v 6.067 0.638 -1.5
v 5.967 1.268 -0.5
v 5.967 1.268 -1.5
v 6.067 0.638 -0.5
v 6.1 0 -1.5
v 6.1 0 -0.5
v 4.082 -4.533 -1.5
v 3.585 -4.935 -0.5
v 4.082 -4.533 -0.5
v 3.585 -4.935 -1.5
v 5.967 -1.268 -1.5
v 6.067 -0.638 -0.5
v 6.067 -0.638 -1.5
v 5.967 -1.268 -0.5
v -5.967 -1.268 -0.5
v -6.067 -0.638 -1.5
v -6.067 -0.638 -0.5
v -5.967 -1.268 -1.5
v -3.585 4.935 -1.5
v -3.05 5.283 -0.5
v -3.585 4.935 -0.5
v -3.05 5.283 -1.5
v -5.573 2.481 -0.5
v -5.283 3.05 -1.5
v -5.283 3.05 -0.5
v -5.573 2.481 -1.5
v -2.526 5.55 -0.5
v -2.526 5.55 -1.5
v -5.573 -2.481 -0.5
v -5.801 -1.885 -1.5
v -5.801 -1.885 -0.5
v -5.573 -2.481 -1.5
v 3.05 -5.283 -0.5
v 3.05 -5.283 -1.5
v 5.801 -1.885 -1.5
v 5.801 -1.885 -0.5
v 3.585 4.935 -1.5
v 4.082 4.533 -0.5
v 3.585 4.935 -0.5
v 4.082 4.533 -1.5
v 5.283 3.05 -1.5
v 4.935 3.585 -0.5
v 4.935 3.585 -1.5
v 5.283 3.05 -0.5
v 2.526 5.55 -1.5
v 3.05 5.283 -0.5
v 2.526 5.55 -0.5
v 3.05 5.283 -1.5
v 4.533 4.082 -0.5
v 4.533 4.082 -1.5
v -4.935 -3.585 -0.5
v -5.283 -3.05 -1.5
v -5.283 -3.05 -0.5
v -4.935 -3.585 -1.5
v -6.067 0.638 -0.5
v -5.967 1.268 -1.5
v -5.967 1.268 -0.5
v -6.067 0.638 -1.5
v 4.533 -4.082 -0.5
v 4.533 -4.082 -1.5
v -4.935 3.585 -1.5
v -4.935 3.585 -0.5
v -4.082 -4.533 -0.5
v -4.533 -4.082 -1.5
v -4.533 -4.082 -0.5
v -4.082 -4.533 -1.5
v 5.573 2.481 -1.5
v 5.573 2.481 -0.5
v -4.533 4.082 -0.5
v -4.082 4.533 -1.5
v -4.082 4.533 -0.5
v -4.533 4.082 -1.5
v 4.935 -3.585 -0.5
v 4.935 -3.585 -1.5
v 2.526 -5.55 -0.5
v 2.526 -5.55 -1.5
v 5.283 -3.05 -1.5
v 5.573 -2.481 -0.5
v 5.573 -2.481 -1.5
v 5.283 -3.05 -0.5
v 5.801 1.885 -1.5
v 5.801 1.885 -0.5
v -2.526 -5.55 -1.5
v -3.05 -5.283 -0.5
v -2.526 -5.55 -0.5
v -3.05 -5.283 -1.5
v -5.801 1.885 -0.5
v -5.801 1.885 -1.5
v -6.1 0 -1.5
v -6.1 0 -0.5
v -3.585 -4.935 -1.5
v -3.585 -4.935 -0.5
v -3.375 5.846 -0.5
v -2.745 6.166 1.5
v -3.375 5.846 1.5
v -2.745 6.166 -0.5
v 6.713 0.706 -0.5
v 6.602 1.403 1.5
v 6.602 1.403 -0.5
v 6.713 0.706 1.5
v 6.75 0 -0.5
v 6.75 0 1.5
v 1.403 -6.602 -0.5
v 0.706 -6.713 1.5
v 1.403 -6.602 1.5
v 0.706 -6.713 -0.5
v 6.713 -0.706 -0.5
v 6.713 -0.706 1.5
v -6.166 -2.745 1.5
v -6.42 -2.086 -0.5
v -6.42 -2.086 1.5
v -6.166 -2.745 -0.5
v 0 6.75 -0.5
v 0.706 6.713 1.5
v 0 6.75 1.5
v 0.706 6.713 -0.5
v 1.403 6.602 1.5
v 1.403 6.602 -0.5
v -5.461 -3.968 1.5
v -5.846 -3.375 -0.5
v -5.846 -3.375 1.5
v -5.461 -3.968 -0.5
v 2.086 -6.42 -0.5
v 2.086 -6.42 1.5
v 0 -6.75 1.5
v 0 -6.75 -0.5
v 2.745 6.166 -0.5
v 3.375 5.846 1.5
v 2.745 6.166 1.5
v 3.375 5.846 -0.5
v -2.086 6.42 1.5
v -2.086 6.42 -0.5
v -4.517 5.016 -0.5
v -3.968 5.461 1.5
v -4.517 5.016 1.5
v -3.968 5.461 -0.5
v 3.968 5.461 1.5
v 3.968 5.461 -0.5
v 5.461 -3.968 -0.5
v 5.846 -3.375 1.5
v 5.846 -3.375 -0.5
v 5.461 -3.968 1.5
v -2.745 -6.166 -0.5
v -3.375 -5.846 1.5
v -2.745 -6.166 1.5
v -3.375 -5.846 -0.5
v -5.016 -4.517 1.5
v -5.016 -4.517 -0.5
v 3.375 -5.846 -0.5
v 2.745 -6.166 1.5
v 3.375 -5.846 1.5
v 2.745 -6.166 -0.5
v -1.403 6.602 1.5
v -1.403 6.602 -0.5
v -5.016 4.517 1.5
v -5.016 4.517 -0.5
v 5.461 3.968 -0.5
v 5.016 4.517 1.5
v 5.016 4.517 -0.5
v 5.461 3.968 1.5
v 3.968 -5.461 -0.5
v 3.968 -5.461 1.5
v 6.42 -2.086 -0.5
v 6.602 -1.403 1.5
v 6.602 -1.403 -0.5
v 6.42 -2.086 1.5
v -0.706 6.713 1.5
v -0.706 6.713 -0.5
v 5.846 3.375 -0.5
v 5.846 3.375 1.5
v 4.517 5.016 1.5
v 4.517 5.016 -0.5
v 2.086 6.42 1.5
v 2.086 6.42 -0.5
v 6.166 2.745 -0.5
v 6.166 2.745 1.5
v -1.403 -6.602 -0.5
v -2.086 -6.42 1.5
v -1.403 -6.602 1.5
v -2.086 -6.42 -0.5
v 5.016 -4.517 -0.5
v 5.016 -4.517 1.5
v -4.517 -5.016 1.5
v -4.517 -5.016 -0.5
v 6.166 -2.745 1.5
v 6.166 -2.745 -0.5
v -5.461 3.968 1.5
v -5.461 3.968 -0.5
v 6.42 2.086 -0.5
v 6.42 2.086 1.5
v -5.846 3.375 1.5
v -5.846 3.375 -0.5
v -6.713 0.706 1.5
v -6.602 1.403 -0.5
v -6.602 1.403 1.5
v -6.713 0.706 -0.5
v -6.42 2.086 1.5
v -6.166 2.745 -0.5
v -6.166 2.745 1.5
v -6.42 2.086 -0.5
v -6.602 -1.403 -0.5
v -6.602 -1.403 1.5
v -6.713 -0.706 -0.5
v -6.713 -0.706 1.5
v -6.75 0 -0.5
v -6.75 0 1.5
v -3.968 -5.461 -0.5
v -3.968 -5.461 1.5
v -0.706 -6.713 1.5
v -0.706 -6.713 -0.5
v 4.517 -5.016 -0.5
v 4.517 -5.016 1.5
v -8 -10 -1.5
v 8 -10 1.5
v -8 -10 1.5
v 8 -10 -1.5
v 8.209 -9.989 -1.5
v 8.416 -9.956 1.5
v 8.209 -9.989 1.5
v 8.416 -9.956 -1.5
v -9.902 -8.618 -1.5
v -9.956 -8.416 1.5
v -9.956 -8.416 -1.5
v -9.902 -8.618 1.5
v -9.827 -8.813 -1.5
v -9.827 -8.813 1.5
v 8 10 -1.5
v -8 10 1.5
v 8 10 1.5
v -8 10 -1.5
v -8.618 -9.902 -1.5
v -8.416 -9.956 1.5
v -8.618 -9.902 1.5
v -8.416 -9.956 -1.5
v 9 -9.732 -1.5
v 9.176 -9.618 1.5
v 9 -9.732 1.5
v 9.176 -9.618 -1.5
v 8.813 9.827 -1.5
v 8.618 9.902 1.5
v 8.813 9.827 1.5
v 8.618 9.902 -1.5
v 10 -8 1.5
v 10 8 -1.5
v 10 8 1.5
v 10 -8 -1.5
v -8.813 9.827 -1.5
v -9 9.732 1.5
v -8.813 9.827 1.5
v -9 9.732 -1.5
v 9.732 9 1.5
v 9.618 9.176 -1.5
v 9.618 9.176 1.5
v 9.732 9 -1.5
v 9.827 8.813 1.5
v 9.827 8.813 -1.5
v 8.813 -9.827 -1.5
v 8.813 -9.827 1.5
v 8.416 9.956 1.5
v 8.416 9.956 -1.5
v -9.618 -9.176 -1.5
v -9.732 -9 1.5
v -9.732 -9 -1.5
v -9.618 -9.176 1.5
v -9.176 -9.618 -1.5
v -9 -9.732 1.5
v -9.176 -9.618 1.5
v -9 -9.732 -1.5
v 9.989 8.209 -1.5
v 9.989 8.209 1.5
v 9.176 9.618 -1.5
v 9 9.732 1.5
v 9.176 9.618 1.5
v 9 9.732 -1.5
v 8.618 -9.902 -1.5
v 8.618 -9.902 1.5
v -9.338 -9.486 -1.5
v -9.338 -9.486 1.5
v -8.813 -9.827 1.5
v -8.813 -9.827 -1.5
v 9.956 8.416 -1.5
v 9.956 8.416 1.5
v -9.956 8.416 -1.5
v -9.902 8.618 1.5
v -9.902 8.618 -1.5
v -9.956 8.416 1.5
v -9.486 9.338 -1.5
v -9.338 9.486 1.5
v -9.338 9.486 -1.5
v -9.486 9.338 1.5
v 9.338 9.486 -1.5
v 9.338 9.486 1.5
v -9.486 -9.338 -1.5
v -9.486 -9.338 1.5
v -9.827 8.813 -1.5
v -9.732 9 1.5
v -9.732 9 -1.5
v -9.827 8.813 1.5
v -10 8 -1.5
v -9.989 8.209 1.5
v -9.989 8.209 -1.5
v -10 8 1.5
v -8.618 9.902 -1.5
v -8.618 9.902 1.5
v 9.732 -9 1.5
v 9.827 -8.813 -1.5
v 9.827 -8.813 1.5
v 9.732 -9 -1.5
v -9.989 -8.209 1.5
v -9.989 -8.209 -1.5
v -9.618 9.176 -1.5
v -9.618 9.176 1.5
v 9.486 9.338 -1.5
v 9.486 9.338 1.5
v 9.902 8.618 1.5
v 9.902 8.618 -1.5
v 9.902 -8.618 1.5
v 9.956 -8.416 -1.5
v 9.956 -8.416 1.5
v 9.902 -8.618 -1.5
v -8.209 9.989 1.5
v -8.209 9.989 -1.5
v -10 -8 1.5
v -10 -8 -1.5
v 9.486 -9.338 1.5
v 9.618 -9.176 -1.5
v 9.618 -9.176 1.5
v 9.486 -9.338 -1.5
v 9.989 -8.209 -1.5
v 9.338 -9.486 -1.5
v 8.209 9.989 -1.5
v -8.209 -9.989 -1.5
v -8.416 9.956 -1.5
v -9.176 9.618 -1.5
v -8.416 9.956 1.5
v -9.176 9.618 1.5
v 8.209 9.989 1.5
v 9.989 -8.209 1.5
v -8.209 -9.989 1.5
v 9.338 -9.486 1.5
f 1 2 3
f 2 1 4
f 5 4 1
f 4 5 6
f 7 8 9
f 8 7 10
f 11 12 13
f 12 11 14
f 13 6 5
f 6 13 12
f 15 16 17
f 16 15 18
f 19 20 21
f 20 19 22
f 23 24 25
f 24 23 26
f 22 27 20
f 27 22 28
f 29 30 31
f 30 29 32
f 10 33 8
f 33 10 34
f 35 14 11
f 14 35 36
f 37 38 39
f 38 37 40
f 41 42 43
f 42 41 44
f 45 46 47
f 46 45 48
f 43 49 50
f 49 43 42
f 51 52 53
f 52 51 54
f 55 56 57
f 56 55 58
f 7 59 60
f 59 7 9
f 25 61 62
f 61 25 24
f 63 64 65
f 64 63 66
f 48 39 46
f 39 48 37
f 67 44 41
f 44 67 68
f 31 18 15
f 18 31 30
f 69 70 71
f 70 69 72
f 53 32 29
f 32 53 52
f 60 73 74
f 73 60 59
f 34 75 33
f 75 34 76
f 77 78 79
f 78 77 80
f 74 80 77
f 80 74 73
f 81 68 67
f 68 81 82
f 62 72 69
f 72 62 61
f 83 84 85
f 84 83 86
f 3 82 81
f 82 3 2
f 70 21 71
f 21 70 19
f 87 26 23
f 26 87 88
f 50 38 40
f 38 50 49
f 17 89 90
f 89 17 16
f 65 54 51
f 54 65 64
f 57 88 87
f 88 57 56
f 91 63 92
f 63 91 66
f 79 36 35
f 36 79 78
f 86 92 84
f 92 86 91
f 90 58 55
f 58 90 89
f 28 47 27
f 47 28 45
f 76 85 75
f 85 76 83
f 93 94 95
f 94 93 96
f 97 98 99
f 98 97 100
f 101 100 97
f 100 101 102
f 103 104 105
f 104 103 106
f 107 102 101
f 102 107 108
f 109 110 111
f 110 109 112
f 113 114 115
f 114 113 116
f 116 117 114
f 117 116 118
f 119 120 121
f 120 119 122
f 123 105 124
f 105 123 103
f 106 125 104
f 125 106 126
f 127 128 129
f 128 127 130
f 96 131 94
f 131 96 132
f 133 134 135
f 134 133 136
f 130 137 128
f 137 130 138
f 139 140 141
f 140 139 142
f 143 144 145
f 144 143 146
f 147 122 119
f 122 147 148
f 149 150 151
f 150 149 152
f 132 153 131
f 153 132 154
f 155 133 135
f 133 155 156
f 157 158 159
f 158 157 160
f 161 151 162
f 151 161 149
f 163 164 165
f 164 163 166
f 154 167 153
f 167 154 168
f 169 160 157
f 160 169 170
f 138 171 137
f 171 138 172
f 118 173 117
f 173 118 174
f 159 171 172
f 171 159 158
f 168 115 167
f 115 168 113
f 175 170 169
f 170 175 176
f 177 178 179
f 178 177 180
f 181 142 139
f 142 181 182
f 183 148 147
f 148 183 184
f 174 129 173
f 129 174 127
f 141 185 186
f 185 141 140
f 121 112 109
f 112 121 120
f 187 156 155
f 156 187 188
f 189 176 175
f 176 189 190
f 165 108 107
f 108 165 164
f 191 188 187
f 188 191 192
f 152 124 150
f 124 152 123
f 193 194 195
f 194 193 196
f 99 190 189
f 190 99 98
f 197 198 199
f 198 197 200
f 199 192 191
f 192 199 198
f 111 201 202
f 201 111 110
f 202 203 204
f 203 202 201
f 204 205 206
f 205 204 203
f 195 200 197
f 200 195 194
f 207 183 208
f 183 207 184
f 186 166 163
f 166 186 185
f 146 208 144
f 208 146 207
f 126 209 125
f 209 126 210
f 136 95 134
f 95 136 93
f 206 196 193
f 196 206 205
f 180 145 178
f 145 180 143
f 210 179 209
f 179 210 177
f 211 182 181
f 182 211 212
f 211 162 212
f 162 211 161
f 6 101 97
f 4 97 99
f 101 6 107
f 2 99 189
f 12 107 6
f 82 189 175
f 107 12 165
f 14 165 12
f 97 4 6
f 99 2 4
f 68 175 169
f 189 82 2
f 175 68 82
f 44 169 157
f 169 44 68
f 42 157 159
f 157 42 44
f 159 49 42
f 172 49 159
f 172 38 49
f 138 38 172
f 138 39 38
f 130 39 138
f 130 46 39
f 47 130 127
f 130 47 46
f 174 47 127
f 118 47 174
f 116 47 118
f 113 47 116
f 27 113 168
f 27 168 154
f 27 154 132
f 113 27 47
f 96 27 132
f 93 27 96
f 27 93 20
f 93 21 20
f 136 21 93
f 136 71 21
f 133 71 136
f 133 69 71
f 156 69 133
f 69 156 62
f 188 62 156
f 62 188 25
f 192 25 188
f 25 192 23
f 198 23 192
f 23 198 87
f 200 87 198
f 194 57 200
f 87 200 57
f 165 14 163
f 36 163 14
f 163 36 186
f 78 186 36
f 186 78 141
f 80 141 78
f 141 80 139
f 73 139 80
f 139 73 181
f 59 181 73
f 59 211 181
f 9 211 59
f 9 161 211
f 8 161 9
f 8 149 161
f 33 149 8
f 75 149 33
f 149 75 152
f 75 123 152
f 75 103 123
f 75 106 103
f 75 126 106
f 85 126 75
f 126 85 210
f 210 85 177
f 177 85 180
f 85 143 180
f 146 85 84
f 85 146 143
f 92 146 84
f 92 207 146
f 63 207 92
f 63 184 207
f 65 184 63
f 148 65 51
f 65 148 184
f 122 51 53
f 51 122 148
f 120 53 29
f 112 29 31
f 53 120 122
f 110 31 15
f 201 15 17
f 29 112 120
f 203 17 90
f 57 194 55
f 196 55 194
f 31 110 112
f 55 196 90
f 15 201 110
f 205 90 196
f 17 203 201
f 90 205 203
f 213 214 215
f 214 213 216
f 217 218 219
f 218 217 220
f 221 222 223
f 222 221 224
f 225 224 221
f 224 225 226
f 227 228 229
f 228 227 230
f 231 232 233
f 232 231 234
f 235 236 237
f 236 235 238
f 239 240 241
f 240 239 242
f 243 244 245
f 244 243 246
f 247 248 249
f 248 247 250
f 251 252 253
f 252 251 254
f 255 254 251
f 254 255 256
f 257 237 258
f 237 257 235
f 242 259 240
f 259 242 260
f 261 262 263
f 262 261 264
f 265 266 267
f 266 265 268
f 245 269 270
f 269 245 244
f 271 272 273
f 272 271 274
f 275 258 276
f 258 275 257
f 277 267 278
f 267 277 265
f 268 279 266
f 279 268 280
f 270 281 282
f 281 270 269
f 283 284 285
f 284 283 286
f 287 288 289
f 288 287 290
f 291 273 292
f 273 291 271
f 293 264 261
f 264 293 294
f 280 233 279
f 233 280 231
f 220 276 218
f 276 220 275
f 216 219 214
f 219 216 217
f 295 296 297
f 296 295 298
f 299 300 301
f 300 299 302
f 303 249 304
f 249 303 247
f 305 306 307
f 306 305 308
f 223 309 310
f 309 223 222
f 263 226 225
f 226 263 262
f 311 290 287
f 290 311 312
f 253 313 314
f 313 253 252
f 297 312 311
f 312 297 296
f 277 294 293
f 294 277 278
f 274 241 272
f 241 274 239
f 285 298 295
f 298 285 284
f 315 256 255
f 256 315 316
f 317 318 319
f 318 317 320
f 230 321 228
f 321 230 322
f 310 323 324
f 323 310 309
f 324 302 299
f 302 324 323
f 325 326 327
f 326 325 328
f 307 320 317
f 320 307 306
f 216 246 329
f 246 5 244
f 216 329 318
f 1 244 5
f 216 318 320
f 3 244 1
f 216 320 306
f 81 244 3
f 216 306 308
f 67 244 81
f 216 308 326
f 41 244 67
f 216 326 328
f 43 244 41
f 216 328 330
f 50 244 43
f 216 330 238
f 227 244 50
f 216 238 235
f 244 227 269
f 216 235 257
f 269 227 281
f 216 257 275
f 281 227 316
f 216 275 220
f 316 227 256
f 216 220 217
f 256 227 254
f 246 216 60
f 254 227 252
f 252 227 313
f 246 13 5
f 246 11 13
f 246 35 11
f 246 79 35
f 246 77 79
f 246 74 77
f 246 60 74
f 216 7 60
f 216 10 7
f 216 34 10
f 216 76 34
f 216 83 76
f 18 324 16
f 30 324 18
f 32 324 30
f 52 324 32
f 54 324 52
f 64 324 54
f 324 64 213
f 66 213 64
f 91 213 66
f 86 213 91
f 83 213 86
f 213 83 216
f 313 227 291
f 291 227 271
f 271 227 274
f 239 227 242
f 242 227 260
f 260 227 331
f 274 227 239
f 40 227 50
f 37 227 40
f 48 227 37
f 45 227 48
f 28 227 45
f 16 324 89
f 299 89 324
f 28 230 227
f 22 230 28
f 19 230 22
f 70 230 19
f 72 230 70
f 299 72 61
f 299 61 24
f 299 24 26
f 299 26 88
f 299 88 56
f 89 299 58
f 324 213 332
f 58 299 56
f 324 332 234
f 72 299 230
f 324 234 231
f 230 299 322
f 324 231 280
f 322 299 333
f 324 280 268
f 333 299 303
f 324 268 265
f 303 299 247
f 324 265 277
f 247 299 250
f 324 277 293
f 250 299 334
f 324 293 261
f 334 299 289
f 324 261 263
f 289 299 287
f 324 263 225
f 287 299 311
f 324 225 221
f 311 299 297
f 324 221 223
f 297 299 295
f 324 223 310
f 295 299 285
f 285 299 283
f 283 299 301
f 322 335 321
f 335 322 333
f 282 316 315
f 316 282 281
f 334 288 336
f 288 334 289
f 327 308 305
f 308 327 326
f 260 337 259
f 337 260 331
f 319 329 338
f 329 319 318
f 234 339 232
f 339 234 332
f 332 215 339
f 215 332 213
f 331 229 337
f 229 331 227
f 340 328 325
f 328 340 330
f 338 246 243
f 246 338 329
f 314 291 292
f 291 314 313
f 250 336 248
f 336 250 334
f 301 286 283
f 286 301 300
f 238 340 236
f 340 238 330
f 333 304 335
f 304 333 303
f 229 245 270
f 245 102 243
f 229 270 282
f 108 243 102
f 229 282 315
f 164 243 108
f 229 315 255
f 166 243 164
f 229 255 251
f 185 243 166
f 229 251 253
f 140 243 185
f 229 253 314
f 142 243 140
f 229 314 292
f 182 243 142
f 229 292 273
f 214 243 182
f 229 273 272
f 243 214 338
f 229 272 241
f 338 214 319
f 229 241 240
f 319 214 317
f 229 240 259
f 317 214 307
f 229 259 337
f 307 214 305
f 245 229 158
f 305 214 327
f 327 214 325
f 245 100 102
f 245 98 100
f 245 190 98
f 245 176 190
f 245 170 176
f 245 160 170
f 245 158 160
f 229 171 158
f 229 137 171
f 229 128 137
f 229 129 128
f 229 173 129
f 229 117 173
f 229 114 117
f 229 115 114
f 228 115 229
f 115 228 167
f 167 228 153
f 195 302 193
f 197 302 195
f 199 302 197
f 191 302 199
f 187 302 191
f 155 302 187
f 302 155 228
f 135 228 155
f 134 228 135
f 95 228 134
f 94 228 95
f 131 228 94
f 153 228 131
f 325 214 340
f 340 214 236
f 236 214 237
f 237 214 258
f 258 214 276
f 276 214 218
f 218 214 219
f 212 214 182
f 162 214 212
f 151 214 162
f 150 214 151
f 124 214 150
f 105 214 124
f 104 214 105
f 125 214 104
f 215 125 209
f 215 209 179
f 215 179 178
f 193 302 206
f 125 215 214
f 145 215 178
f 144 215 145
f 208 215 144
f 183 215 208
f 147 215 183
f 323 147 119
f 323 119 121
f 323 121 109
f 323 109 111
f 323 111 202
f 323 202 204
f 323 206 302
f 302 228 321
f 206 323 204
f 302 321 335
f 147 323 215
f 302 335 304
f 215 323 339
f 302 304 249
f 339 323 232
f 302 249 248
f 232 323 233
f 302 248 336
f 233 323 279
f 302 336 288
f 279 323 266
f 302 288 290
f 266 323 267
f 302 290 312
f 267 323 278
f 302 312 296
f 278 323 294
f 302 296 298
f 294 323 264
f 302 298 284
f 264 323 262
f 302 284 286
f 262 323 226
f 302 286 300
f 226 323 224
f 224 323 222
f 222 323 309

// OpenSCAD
// file: button_PBS-33B.scad
$fn = 60;

buttonOD = 10;
buttoniD = 5.6;
buttonHeigth = 1.6;
//buttonHeigth = 2.6;

headOD   = 17.5;
headMD  = 14.83;
headID  = 11.8;
headHeigth = 5.5;

stepShaftOD  = 13.5; // 13.1
stepShaftHeigth = 2; // .6

threadOD = 12.2; //12 // M12x0.75
threadFD = 11.1; //11
threadHeigth = 7;

plugOD = 8.7;
plugHeigth = 2;

pinHeigth = 3.6;
pinWidth = 2.8;
pinDepth = 1;
pinSeperation = 4.6;

main("C");

////////////////////////////////////////////////////////////////////////////////////////////////////
module PBS_33B_Simple(){
	main("S");
}

////////////////////////////////////////////////////////////////////////////////////////////////////
module main(type){
	intersection(){
		union(){
			translate([0,0,stepShaftHeigth]) 
				head();
			translate([0,0,headHeigth+2.2]) 
				button();
			shaft();
			if(type == "C"){
				translate([0,0,(-threadHeigth)-(plugHeigth/2)]) 
					Plug();
			}
		}
		cube([20,20,30],center=true);
	}
}
////////////////////////////////////////////////////////////////////////////////////////////////////
module head(){
	difference(){
		intersection(){
			sphere(d=headOD,center=true);
			translate([0,0,headHeigth/2])
				cube([headOD,headOD,headHeigth],center=true);
		}
		cylinder(d=headID,h=headOD+1,center=true);
	}
}
////////////////////////////////////////////////////////////////////////////////////////////////////
module button(){
	intersection(){
		cylinder(d=headID-.1,h=buttonHeigth+10,center=true); 
		button2();
	}
}
////////////////////////////////////////////////////////////////////////////////////////////////////
module button2(){
	intersection(){
		translate([0,0,-8])
			sphere(d=buttonOD+10,center=true);
		translate([0,0,buttonHeigth/2])
			cube([headID,headID,buttonHeigth],center=true);
	}
	translate([0,0,-buttonHeigth/2])
		cylinder(d=headID-.1,h=buttonHeigth,center=true); 
//	#cylinder(d=buttoniD,h=buttoniD+10,center=true); 
}
////////////////////////////////////////////////////////////////////////////////////////////////////
module shaft(){
	translate([0,0,stepShaftHeigth/2])
		cylinder(d=stepShaftOD,h=stepShaftHeigth,center=true);
	translate([0,0,(stepShaftHeigth/2)-.1])
		cylinder(d=stepShaftOD,h=stepShaftHeigth,center=true);
	intersection(){
		translate([0,0,-threadHeigth/2]){
			intersection(){
				cylinder(d=threadOD,h=threadHeigth,center=true);
				cube([threadOD,threadFD,threadHeigth],center=true);
			}
		}
	}
}
////////////////////////////////////////////////////////////////////////////////////////////////////
module Plug(){
	cylinder(d=plugOD,h=plugHeigth,center=true);
	for (a =[1,-1]){
		translate([0,a*(pinSeperation/2),-(pinHeigth/2)])
			cubeSphere(pinWidth,pinDepth,pinHeigth,1);
	}
}
////////////////////////////////////////////////////////////////////////////////////////////////////
module cubeSphere(iX, iYm, iZ, iD){

	edgeDiamitor = iD;
	
	hull(){
		for(a=[[1,1,1],[-1,1,1],[1,-1,1],[-1,-1,1],[1,1,-1],[-1,1,-1],[1,-1,-1],[-1,-1,-1]]){
			translate([
				a[0]*((iX/2) -(edgeDiamitor/2)), 
				a[1]*((iYm/2)-(edgeDiamitor/2)), 
				a[2]*((iZ/2) -(edgeDiamitor/2))]) sphere(d=edgeDiamitor);
		}
	}
}
// main file
$fn = 60;

use <button_PBS-33B.scad>;

intersection(){
	difference(){
		plate4Point(20,20,3,4);
		translate([0,0,-.4])
			button();
//		cube([5,25,5],center=true);
	}
	cube([30,30,30],center=true);
}
////////////////////////////////////////////////////////////////////////////////////////////////////
module plate4Point(x,y,z,d){
	hull(){
		color("green") translate([(x/2)-(d/2) ,(y/2) -(d/2),0]) cylinder(h=z, d=d, center=true);
		color("blue")  translate([(x/2)-(d/2) ,-(y/2)+(d/2),0]) cylinder(h=z, d=d, center=true);
		color("red")   translate([-(x/2)+(d/2),(y/2) -(d/2),0]) cylinder(h=z, d=d, center=true);
		color("grey")  translate([-(x/2)+(d/2),-(y/2)+(d/2),0]) cylinder(h=z, d=d, center=true);
	}
}
////////////////////////////////////////////////////////////////////////////////////////////////////
module button(){
		PBS_33B_Simple();
}
